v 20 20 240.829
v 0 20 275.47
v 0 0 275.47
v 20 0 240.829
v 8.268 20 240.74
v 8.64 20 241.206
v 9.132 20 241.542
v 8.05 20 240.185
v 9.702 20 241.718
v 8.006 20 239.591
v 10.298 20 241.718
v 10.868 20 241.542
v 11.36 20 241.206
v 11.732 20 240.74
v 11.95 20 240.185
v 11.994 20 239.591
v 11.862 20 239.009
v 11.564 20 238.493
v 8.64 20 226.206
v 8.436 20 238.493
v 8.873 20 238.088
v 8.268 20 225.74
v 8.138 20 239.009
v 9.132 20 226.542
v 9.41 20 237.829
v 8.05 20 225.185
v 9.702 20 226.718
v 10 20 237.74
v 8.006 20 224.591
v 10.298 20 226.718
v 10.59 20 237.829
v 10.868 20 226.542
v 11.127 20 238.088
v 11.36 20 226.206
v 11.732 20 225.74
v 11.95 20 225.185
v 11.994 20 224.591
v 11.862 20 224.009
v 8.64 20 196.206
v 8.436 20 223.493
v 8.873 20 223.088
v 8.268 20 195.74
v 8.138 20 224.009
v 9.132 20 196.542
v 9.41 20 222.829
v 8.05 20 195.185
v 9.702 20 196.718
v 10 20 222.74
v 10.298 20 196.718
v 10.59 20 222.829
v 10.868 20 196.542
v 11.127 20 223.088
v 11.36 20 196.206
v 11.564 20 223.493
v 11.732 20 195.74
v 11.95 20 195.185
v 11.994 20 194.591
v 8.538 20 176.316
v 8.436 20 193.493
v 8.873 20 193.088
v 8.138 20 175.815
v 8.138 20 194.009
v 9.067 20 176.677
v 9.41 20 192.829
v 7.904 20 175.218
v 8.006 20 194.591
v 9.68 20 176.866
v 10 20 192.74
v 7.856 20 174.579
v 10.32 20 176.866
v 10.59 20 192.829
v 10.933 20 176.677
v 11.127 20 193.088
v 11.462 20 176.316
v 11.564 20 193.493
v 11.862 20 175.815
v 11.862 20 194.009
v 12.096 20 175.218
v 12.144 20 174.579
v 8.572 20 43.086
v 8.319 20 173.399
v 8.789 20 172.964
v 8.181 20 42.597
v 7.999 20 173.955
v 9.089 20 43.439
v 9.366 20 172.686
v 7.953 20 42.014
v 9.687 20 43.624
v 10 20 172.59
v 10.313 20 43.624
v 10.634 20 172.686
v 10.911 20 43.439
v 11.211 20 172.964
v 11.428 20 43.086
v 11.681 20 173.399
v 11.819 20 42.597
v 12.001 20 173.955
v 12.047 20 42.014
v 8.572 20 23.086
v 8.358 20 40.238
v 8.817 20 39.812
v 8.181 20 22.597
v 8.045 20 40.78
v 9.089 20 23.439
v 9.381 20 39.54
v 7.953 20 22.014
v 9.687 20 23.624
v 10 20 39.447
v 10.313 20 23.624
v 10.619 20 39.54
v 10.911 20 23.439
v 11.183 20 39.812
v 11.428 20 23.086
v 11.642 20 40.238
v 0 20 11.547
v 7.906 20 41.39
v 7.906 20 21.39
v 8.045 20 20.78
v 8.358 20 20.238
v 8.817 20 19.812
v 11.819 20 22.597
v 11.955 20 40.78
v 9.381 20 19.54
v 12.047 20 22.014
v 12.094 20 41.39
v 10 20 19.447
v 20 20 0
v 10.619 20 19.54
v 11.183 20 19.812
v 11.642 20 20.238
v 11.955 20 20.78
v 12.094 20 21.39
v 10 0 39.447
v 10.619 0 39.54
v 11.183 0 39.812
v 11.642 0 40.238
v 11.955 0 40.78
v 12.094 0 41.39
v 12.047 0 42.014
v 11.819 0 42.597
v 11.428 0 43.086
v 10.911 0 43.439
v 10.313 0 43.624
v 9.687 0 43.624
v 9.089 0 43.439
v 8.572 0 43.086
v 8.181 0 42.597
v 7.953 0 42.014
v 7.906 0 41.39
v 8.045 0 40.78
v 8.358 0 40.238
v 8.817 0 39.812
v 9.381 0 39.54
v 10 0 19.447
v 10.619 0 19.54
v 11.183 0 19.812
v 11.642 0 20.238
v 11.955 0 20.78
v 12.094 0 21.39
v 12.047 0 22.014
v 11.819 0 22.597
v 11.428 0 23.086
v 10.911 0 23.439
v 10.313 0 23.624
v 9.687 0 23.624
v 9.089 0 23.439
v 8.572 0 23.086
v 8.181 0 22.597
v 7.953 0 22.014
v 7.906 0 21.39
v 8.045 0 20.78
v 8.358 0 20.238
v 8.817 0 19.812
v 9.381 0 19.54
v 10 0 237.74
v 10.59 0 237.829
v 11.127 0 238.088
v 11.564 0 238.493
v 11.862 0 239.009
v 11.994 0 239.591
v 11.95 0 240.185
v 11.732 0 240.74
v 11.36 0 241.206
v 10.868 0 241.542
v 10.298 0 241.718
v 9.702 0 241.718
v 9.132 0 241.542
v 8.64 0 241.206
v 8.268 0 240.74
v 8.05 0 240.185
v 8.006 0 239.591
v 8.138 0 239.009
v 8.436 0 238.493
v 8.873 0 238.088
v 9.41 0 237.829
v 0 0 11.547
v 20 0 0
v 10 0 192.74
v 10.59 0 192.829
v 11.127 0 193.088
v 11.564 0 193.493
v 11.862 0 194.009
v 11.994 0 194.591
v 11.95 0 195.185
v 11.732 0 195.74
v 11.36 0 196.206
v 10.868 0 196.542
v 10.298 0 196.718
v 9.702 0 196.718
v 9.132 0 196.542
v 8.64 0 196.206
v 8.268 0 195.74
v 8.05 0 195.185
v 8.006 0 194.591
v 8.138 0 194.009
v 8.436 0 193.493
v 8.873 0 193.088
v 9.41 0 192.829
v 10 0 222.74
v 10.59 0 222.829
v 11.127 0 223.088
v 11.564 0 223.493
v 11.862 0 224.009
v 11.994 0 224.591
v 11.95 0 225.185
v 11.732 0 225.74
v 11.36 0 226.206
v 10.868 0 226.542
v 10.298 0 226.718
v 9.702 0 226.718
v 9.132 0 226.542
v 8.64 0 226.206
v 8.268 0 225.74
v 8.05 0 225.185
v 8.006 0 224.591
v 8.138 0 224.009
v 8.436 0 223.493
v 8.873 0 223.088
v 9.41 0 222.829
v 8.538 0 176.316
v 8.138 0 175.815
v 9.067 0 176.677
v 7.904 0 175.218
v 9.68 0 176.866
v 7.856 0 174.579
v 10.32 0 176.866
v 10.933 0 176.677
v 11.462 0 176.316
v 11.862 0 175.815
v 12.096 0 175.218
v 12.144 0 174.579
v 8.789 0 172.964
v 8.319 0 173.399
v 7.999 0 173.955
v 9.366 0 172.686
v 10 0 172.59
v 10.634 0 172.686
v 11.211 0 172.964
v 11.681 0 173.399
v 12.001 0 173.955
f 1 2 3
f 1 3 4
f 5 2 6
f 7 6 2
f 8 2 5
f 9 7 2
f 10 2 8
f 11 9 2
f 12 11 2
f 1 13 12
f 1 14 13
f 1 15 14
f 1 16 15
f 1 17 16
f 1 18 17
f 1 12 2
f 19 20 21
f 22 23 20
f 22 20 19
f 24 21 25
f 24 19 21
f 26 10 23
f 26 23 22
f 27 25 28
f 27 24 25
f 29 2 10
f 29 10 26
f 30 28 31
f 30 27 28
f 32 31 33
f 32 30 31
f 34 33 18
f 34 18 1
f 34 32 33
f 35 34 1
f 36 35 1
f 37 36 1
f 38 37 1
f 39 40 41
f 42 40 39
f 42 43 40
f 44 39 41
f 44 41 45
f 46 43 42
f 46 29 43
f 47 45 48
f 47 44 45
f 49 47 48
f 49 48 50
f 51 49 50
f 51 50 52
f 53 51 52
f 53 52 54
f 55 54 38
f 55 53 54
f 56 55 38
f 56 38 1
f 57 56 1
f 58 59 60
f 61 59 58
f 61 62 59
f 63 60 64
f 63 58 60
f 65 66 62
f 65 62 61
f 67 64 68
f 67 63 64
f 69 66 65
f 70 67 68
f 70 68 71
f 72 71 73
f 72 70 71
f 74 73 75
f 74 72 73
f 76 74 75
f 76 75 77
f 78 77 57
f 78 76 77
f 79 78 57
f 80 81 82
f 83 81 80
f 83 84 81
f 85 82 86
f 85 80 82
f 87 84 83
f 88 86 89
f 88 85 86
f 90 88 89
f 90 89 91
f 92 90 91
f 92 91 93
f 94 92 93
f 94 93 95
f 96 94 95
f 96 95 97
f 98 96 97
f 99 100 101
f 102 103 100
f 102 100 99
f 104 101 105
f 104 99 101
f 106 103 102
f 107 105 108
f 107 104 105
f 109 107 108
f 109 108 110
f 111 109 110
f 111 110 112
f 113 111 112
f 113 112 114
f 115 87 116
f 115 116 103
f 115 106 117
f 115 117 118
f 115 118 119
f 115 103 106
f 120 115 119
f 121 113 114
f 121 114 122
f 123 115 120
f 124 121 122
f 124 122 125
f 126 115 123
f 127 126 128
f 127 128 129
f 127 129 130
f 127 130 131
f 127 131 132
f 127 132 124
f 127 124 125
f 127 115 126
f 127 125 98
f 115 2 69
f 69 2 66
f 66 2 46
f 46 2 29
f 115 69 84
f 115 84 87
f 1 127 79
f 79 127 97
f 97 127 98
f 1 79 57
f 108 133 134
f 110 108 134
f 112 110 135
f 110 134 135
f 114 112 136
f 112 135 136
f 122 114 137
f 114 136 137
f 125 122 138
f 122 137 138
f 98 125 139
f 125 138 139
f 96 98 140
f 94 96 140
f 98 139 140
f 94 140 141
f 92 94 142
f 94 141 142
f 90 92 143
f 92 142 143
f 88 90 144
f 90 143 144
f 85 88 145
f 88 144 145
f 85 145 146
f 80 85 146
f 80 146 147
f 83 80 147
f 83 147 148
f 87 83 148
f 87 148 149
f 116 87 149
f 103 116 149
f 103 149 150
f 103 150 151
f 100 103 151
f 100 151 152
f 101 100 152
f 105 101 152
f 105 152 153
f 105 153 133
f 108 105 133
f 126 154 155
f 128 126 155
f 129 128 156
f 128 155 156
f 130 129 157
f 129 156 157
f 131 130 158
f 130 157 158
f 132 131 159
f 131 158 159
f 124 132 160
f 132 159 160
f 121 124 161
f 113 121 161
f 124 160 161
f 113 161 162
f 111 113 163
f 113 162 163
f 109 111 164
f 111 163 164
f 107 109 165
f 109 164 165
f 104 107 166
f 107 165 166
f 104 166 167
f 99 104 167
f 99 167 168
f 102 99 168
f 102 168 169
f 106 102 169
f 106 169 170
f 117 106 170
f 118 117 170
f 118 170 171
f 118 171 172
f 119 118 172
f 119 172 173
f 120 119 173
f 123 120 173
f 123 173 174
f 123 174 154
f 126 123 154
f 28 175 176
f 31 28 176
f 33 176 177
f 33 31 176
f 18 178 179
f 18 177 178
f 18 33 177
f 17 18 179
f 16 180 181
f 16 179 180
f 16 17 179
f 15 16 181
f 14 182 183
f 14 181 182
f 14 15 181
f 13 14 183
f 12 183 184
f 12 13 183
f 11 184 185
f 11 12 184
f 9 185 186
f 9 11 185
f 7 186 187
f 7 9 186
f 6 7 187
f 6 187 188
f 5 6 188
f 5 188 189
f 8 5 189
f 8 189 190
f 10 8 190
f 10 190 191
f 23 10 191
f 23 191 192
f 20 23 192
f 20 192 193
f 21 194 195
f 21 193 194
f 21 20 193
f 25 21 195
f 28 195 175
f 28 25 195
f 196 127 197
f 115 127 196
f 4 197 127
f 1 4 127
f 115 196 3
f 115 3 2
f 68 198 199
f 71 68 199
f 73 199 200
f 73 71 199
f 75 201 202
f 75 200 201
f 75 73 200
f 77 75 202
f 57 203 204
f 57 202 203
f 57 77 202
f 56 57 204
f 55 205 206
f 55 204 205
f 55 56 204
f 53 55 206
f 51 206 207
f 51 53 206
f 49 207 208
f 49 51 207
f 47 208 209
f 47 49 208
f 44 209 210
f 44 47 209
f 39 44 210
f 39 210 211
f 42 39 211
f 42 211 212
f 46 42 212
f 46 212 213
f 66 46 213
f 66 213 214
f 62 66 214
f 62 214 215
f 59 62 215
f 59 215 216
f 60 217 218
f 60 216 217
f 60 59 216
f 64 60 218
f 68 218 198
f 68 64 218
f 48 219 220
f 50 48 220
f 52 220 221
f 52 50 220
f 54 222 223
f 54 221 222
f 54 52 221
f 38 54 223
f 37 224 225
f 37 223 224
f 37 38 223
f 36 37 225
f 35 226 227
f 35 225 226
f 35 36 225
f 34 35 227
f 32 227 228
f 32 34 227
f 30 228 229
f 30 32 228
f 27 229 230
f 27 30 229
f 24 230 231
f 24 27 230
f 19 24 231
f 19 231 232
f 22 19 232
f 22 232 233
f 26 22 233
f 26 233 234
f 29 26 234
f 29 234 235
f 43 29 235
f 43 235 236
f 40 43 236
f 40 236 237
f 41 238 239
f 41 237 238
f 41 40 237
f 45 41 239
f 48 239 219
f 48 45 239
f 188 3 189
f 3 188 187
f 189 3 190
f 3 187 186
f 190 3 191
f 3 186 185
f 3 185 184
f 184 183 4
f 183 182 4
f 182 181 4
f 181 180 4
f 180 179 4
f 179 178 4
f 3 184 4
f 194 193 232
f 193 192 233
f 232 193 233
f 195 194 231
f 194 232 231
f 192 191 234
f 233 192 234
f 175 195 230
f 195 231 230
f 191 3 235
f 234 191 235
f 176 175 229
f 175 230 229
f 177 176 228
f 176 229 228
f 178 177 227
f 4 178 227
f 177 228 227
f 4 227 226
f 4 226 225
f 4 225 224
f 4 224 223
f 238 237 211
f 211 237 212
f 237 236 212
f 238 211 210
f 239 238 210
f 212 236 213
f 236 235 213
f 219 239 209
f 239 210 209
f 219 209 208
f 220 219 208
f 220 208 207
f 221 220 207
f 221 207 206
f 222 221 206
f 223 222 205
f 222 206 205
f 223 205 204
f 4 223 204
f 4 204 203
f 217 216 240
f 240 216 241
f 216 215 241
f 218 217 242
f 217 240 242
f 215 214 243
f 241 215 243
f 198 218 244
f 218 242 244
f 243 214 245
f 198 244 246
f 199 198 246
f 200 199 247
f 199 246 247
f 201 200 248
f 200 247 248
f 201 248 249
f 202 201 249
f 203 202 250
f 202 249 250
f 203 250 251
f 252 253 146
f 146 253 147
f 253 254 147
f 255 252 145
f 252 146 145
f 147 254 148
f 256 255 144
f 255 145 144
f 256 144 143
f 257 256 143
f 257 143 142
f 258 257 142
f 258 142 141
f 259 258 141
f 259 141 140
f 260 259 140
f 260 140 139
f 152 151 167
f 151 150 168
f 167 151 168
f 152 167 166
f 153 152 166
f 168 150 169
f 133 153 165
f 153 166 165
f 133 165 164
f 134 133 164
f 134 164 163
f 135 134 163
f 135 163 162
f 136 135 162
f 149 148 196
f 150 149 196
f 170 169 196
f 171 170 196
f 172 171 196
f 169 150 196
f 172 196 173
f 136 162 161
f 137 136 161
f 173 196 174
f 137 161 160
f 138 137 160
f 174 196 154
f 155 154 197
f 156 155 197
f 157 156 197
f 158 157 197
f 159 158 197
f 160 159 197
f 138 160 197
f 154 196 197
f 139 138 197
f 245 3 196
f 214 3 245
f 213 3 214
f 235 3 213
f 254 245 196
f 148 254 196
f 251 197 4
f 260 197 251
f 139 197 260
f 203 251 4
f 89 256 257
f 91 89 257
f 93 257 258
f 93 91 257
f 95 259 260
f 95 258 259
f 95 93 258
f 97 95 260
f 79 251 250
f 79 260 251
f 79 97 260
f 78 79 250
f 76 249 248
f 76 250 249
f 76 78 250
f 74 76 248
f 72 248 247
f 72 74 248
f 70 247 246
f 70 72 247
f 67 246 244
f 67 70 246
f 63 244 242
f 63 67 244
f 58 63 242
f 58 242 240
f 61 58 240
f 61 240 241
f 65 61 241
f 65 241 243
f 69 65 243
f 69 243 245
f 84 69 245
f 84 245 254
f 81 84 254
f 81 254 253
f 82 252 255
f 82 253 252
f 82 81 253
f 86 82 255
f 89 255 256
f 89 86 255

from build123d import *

# Parameters (mm, degrees)
SKETCH_1_W               = 20
SKETCH_1_H               = 20
EXTRUDE_1_DEPTH          = 275.47
CUT_EXTRUDE_1_DEPTH      = 263.92
CUT_EXTRUDE_2_DEPTH      = 277.918256711
CUT_EXTRUDE_2_DEPTH_BACK = 277.918256711
SKETCH_3_R               = 2
SKETCH_3_R_2             = 2.15
SKETCH_4_R               = 2.1
CUT_EXTRUDE_3_DEPTH      = 60


with BuildPart() as part:
    # 草图1 → 凸台-拉伸1 (new body)
    with BuildSketch(Plane.XY):
        with Locations((10, 10)):
            Rectangle(SKETCH_1_W, SKETCH_1_H)
    extrude(amount=EXTRUDE_1_DEPTH)

    # 草图2 → 切除-拉伸1 (cut)
    with BuildSketch(Plane(origin=(0, 20, 0), x_dir=(1, 0, 0), z_dir=(0, 1, 0))):
        Polygon((0, -275.47), (20, -240.828983849), (20, -275.47), align=None)
        Polygon((20, 0), (0, -11.547005384), (0, 0), align=None)
    extrude(amount=-CUT_EXTRUDE_1_DEPTH, mode=Mode.SUBTRACT)

    # 草图3 → 切除-拉伸2 (cut, two sides: drawn at the far end of the back side and taken through both)
    with BuildSketch(Plane.XZ.offset(-CUT_EXTRUDE_2_DEPTH_BACK)):
        with Locations(Location((10, 239.74, 0), (0, 0, 270))):
            Circle(SKETCH_3_R)
        with Locations(Location((10, 224.74, 0), (0, 0, 270))):
            Circle(SKETCH_3_R)
        with Locations(Location((10, 194.74, 0), (0, 0, 270))):
            Circle(SKETCH_3_R)
        with Locations(Location((10, 174.74, 0), (0, 0, 270))):
            Circle(SKETCH_3_R_2)
    extrude(amount=CUT_EXTRUDE_2_DEPTH + CUT_EXTRUDE_2_DEPTH_BACK, mode=Mode.SUBTRACT)

    # 草图4 → 切除-拉伸3 (cut)
    with BuildSketch(Plane.XZ):
        with Locations(Location((10, 21.547005384, 0), (0, 0, 270))):
            Circle(SKETCH_4_R)
        with Locations(Location((10, 41.547005384, 0), (0, 0, 270))):
            Circle(SKETCH_4_R)
    extrude(amount=-CUT_EXTRUDE_3_DEPTH, mode=Mode.SUBTRACT)


solid = part.part
